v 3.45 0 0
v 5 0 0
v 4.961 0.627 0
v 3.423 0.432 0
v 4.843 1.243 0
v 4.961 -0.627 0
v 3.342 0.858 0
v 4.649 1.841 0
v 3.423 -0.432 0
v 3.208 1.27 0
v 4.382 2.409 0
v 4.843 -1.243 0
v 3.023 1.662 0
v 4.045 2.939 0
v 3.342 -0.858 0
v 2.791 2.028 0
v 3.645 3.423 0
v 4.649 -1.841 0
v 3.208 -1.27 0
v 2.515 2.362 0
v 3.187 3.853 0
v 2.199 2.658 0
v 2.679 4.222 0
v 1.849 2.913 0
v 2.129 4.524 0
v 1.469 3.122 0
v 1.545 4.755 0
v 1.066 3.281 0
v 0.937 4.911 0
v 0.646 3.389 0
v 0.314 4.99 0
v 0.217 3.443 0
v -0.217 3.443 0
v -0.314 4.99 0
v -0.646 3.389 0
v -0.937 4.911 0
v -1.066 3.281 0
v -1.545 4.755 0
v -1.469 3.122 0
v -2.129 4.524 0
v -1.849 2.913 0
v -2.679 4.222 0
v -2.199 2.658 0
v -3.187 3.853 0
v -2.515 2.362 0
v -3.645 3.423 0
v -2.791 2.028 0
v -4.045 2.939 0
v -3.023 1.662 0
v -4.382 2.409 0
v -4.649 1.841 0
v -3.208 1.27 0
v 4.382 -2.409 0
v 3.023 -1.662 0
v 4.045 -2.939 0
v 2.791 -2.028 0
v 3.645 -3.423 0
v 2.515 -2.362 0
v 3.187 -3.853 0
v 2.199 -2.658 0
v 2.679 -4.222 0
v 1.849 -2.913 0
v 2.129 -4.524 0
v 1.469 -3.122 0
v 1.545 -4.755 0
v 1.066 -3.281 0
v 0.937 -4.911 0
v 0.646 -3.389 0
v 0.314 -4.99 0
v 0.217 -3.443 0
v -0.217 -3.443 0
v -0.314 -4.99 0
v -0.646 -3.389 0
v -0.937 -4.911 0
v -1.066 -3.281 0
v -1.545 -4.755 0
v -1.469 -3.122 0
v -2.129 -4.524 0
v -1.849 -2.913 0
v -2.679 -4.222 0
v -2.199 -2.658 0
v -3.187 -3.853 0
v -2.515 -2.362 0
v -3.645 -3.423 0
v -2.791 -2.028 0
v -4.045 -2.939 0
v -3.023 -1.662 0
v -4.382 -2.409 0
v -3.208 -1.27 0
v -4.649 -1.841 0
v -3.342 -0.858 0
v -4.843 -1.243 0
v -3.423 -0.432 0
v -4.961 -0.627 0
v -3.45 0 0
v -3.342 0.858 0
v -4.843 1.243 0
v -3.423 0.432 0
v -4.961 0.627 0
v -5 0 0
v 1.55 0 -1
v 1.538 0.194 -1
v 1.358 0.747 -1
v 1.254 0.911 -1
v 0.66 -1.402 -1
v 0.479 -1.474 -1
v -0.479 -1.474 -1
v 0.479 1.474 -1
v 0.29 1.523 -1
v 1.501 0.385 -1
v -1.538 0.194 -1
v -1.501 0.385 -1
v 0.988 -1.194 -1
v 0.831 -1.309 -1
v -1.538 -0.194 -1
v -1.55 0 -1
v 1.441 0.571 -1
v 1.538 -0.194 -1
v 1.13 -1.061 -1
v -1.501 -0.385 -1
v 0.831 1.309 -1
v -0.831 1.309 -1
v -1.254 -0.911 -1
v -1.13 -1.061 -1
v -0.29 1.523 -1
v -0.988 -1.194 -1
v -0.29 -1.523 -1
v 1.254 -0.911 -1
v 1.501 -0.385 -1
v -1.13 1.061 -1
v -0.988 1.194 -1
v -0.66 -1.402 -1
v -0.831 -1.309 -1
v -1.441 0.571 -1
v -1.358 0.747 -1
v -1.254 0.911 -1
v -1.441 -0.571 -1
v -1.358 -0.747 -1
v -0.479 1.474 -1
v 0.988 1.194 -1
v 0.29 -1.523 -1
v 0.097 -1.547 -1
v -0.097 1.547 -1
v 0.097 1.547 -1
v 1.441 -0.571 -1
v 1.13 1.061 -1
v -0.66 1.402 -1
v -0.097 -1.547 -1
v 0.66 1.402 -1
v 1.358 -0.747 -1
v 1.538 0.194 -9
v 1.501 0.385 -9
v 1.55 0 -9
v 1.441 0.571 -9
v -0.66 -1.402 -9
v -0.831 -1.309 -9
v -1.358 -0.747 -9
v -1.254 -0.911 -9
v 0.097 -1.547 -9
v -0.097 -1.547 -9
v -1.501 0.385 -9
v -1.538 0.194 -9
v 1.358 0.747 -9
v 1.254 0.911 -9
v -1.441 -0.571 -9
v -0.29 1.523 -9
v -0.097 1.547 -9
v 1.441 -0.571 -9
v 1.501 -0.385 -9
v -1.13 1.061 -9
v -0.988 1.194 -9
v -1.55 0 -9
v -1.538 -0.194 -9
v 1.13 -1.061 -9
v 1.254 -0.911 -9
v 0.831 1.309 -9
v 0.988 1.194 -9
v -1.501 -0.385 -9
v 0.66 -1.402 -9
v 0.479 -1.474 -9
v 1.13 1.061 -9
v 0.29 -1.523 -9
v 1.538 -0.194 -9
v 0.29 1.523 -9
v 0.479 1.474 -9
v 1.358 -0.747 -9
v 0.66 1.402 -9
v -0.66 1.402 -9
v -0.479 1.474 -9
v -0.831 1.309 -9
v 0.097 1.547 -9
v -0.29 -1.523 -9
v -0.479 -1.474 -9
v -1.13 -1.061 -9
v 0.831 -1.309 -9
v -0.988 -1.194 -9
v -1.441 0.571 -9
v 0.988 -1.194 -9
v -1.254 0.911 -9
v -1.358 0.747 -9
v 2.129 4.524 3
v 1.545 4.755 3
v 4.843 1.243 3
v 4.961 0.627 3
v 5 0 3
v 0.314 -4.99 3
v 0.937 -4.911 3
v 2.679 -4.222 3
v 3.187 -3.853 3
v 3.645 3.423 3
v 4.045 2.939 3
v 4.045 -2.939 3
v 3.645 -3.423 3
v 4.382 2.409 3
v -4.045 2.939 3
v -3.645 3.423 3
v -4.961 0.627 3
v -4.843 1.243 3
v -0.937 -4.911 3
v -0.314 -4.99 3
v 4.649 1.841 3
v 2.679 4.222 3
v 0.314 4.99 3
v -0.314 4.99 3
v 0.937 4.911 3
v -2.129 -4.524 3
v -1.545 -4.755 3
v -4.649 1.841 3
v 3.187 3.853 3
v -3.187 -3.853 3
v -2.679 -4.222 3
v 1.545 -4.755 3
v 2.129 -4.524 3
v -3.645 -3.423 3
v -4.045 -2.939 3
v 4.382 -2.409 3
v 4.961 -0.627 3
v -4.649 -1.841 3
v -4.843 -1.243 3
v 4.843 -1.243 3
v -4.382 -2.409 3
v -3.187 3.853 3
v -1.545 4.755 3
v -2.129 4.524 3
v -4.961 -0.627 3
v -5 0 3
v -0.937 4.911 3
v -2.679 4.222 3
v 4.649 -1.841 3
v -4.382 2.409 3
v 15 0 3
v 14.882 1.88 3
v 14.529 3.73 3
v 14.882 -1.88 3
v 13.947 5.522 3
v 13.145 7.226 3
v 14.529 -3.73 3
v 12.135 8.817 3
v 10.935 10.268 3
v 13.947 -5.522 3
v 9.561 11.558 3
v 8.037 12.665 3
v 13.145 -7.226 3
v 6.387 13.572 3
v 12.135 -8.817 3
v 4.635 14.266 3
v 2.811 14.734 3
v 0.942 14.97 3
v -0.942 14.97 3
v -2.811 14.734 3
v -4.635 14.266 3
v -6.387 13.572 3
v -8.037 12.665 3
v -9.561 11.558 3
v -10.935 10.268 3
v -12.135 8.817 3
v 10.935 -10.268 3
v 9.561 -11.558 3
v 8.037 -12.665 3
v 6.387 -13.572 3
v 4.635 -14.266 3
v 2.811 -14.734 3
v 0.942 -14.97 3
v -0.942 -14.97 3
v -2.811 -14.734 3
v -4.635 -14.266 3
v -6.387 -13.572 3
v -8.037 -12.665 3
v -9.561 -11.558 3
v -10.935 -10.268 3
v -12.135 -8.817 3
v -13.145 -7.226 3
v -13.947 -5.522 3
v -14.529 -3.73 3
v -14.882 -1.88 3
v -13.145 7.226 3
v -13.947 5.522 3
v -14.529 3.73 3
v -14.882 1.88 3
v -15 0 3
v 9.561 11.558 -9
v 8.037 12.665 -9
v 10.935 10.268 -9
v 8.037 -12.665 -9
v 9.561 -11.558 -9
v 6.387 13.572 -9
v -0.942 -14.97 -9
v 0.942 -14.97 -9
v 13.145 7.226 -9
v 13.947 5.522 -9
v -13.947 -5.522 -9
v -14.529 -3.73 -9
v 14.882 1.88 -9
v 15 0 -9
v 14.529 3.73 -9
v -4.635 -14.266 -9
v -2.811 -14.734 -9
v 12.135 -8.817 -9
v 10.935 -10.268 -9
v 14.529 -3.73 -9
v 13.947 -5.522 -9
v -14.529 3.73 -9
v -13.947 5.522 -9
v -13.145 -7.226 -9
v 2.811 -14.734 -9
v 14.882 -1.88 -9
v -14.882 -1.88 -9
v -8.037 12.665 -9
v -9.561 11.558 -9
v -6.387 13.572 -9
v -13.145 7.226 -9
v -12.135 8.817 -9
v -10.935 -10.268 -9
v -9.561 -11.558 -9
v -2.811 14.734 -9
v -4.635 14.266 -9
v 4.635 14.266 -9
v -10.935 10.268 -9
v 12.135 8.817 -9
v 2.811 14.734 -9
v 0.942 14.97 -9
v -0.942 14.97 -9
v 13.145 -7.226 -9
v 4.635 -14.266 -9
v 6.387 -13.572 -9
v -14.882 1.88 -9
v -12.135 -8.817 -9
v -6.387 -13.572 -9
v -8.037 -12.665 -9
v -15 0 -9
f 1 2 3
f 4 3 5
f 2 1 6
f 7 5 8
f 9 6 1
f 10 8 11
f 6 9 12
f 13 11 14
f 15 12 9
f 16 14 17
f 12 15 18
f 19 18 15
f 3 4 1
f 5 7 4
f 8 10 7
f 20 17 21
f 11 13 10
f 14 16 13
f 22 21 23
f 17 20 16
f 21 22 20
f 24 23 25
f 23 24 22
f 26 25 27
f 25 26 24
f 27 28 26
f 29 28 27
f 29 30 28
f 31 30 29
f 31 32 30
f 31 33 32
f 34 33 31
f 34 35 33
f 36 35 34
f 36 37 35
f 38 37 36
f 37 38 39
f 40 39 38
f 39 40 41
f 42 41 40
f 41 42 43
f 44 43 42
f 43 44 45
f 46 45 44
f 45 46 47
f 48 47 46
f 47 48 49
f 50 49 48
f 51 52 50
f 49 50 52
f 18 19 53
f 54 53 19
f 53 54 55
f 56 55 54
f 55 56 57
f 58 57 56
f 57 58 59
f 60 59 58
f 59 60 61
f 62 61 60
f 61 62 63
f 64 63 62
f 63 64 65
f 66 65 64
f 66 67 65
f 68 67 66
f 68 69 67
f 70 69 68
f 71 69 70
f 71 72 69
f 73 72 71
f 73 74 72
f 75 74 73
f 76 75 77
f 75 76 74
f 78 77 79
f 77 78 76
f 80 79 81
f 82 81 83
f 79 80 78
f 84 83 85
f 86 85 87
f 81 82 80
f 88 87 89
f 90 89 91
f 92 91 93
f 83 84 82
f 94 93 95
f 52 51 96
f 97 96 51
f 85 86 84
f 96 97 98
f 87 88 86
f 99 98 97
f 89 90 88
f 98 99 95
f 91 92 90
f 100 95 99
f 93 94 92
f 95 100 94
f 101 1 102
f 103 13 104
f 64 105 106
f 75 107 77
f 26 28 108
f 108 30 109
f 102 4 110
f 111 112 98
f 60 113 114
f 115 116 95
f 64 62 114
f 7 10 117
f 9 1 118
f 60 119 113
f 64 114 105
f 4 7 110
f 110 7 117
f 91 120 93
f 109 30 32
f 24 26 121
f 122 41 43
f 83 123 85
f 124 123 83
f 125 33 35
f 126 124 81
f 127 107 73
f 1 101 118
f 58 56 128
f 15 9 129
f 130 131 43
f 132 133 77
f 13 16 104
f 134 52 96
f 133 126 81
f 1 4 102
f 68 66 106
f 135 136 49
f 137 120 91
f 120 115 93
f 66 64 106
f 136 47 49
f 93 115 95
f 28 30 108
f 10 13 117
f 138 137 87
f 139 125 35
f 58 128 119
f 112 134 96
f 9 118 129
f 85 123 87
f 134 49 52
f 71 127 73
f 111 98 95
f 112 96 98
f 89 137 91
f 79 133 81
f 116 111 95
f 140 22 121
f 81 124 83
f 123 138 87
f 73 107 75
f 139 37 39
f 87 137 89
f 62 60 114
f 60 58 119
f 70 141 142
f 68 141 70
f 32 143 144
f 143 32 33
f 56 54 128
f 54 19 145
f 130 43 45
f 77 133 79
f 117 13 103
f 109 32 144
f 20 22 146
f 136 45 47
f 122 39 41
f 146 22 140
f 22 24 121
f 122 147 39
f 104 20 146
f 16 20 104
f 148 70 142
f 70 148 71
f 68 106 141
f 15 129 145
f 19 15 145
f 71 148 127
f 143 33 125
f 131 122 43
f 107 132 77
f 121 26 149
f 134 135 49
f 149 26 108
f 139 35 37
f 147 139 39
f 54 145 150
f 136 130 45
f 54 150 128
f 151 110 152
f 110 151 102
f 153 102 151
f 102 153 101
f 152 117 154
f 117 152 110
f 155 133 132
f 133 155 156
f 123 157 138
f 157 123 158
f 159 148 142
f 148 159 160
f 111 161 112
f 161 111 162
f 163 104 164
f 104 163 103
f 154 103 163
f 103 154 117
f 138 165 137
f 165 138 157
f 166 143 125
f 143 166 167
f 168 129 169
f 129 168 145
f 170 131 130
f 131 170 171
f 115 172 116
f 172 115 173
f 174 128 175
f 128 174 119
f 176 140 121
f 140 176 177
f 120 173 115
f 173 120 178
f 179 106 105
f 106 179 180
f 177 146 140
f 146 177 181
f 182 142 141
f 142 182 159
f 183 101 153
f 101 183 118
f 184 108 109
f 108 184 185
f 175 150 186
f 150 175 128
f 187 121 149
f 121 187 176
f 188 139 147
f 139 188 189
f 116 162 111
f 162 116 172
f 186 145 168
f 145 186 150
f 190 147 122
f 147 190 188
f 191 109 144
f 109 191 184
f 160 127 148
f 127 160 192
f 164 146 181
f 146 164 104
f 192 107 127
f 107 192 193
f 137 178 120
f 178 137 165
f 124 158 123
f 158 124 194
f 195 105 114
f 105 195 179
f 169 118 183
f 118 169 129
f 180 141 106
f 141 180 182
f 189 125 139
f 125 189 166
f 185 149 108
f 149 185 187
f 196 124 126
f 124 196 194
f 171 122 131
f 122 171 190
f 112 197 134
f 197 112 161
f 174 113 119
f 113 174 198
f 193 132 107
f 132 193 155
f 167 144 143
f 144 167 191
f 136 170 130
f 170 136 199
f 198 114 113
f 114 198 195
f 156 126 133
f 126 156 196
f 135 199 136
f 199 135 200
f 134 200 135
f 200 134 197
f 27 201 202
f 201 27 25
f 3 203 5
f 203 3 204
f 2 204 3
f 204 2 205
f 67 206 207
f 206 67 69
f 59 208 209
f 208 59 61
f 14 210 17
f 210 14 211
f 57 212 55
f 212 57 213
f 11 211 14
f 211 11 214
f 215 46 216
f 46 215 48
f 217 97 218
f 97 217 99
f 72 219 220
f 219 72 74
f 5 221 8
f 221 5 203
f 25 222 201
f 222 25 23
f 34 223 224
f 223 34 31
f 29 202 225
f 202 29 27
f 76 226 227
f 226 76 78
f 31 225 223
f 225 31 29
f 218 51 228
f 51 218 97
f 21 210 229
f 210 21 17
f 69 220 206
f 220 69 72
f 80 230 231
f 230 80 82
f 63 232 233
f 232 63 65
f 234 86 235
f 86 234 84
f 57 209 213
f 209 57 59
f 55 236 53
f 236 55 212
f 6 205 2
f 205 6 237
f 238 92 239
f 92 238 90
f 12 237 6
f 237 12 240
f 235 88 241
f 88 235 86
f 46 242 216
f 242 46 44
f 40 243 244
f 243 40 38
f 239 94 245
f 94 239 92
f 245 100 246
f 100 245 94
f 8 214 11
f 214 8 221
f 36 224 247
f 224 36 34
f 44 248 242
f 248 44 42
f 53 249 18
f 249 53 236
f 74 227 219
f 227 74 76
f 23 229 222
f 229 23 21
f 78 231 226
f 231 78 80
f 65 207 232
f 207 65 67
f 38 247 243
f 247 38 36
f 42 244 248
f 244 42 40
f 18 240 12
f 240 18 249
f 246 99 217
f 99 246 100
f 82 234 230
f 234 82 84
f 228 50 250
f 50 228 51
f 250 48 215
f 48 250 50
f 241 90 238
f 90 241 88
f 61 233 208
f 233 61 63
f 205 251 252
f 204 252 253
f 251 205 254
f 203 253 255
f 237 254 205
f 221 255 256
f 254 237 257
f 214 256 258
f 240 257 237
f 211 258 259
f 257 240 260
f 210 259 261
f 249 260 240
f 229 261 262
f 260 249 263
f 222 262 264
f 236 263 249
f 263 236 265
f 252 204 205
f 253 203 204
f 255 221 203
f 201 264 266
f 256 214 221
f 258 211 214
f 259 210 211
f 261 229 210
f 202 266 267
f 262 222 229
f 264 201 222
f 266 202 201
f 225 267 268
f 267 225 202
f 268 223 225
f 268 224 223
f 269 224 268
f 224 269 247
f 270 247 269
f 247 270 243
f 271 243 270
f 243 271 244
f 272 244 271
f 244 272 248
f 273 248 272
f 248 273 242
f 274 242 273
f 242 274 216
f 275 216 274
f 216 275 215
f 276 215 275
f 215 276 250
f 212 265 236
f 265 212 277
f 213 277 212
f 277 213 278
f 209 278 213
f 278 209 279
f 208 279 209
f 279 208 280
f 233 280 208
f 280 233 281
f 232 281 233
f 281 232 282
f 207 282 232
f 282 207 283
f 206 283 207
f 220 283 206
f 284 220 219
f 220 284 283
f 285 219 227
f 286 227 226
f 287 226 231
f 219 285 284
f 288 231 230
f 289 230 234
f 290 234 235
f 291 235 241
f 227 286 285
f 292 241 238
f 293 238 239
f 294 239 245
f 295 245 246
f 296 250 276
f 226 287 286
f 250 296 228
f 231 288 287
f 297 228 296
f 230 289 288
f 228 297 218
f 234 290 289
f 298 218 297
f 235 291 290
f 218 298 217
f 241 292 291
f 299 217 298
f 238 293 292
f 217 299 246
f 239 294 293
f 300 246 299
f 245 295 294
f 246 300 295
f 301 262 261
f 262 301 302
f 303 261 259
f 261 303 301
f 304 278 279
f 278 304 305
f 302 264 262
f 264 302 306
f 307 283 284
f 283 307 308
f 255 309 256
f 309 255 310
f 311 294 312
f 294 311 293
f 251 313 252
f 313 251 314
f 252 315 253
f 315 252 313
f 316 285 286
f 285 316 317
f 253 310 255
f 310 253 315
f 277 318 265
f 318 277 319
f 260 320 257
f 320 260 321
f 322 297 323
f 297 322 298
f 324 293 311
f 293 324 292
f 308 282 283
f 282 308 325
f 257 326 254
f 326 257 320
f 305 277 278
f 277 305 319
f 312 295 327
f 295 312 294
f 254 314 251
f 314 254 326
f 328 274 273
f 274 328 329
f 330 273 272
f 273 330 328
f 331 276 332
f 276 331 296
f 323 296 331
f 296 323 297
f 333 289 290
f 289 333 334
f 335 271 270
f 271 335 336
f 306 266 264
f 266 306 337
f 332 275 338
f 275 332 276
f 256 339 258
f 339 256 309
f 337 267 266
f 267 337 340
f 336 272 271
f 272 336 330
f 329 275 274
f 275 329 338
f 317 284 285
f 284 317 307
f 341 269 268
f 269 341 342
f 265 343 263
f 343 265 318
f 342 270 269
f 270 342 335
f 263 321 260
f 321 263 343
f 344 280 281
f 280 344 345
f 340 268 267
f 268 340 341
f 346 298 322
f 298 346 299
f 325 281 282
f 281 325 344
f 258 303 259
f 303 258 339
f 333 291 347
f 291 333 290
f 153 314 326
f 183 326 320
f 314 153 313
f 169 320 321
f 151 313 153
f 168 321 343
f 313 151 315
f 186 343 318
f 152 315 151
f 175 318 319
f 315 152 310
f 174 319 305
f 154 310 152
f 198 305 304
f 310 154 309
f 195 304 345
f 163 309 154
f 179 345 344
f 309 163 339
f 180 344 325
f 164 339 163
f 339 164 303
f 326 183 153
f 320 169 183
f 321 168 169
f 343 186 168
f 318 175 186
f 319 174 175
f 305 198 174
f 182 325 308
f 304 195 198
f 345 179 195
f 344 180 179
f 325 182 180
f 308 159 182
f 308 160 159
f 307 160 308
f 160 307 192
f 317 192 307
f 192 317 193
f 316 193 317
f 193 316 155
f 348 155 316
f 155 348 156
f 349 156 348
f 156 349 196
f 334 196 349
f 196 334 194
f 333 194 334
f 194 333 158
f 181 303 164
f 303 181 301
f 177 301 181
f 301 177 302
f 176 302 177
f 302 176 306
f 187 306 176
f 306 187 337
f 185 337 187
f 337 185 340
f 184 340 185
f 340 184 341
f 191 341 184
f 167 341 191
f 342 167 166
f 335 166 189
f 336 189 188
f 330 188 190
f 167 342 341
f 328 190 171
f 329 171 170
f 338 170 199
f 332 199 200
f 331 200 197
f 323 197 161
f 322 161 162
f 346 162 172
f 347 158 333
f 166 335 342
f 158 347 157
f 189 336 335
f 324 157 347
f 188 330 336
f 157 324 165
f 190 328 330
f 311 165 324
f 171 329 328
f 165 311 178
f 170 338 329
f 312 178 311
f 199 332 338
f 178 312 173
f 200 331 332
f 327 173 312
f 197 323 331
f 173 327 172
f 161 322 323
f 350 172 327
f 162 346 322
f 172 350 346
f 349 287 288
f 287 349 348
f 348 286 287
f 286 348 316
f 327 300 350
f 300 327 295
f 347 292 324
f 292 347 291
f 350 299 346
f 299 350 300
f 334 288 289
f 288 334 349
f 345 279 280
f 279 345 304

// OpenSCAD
$fn = 50;


difference() {
	union() {
		translate(v = [0, 0, -9.0000000000]) {
			cylinder(h = 12, r = 15.0000000000);
		}
	}
	union() {
		translate(v = [0, 0, 0]) {
			rotate(a = [0, 0, 0]) {
				difference() {
					union() {
						translate(v = [0, 0, -12.0000000000]) {
							cylinder(h = 12, r = 1.2500000000);
						}
						translate(v = [0, 0, -1.0000000000]) {
							cylinder(h = 1.0000000000, r1 = 1.5500000000, r2 = 3.4500000000);
						}
						translate(v = [0, 0, -12.0000000000]) {
							cylinder(h = 12, r = 1.5500000000);
						}
						translate(v = [0, 0, -12.0000000000]) {
							cylinder(h = 12, r = 1.2500000000);
						}
					}
					union();
				}
			}
		}
		#cylinder(h = 3, r = 5.0000000000);
	}
}
